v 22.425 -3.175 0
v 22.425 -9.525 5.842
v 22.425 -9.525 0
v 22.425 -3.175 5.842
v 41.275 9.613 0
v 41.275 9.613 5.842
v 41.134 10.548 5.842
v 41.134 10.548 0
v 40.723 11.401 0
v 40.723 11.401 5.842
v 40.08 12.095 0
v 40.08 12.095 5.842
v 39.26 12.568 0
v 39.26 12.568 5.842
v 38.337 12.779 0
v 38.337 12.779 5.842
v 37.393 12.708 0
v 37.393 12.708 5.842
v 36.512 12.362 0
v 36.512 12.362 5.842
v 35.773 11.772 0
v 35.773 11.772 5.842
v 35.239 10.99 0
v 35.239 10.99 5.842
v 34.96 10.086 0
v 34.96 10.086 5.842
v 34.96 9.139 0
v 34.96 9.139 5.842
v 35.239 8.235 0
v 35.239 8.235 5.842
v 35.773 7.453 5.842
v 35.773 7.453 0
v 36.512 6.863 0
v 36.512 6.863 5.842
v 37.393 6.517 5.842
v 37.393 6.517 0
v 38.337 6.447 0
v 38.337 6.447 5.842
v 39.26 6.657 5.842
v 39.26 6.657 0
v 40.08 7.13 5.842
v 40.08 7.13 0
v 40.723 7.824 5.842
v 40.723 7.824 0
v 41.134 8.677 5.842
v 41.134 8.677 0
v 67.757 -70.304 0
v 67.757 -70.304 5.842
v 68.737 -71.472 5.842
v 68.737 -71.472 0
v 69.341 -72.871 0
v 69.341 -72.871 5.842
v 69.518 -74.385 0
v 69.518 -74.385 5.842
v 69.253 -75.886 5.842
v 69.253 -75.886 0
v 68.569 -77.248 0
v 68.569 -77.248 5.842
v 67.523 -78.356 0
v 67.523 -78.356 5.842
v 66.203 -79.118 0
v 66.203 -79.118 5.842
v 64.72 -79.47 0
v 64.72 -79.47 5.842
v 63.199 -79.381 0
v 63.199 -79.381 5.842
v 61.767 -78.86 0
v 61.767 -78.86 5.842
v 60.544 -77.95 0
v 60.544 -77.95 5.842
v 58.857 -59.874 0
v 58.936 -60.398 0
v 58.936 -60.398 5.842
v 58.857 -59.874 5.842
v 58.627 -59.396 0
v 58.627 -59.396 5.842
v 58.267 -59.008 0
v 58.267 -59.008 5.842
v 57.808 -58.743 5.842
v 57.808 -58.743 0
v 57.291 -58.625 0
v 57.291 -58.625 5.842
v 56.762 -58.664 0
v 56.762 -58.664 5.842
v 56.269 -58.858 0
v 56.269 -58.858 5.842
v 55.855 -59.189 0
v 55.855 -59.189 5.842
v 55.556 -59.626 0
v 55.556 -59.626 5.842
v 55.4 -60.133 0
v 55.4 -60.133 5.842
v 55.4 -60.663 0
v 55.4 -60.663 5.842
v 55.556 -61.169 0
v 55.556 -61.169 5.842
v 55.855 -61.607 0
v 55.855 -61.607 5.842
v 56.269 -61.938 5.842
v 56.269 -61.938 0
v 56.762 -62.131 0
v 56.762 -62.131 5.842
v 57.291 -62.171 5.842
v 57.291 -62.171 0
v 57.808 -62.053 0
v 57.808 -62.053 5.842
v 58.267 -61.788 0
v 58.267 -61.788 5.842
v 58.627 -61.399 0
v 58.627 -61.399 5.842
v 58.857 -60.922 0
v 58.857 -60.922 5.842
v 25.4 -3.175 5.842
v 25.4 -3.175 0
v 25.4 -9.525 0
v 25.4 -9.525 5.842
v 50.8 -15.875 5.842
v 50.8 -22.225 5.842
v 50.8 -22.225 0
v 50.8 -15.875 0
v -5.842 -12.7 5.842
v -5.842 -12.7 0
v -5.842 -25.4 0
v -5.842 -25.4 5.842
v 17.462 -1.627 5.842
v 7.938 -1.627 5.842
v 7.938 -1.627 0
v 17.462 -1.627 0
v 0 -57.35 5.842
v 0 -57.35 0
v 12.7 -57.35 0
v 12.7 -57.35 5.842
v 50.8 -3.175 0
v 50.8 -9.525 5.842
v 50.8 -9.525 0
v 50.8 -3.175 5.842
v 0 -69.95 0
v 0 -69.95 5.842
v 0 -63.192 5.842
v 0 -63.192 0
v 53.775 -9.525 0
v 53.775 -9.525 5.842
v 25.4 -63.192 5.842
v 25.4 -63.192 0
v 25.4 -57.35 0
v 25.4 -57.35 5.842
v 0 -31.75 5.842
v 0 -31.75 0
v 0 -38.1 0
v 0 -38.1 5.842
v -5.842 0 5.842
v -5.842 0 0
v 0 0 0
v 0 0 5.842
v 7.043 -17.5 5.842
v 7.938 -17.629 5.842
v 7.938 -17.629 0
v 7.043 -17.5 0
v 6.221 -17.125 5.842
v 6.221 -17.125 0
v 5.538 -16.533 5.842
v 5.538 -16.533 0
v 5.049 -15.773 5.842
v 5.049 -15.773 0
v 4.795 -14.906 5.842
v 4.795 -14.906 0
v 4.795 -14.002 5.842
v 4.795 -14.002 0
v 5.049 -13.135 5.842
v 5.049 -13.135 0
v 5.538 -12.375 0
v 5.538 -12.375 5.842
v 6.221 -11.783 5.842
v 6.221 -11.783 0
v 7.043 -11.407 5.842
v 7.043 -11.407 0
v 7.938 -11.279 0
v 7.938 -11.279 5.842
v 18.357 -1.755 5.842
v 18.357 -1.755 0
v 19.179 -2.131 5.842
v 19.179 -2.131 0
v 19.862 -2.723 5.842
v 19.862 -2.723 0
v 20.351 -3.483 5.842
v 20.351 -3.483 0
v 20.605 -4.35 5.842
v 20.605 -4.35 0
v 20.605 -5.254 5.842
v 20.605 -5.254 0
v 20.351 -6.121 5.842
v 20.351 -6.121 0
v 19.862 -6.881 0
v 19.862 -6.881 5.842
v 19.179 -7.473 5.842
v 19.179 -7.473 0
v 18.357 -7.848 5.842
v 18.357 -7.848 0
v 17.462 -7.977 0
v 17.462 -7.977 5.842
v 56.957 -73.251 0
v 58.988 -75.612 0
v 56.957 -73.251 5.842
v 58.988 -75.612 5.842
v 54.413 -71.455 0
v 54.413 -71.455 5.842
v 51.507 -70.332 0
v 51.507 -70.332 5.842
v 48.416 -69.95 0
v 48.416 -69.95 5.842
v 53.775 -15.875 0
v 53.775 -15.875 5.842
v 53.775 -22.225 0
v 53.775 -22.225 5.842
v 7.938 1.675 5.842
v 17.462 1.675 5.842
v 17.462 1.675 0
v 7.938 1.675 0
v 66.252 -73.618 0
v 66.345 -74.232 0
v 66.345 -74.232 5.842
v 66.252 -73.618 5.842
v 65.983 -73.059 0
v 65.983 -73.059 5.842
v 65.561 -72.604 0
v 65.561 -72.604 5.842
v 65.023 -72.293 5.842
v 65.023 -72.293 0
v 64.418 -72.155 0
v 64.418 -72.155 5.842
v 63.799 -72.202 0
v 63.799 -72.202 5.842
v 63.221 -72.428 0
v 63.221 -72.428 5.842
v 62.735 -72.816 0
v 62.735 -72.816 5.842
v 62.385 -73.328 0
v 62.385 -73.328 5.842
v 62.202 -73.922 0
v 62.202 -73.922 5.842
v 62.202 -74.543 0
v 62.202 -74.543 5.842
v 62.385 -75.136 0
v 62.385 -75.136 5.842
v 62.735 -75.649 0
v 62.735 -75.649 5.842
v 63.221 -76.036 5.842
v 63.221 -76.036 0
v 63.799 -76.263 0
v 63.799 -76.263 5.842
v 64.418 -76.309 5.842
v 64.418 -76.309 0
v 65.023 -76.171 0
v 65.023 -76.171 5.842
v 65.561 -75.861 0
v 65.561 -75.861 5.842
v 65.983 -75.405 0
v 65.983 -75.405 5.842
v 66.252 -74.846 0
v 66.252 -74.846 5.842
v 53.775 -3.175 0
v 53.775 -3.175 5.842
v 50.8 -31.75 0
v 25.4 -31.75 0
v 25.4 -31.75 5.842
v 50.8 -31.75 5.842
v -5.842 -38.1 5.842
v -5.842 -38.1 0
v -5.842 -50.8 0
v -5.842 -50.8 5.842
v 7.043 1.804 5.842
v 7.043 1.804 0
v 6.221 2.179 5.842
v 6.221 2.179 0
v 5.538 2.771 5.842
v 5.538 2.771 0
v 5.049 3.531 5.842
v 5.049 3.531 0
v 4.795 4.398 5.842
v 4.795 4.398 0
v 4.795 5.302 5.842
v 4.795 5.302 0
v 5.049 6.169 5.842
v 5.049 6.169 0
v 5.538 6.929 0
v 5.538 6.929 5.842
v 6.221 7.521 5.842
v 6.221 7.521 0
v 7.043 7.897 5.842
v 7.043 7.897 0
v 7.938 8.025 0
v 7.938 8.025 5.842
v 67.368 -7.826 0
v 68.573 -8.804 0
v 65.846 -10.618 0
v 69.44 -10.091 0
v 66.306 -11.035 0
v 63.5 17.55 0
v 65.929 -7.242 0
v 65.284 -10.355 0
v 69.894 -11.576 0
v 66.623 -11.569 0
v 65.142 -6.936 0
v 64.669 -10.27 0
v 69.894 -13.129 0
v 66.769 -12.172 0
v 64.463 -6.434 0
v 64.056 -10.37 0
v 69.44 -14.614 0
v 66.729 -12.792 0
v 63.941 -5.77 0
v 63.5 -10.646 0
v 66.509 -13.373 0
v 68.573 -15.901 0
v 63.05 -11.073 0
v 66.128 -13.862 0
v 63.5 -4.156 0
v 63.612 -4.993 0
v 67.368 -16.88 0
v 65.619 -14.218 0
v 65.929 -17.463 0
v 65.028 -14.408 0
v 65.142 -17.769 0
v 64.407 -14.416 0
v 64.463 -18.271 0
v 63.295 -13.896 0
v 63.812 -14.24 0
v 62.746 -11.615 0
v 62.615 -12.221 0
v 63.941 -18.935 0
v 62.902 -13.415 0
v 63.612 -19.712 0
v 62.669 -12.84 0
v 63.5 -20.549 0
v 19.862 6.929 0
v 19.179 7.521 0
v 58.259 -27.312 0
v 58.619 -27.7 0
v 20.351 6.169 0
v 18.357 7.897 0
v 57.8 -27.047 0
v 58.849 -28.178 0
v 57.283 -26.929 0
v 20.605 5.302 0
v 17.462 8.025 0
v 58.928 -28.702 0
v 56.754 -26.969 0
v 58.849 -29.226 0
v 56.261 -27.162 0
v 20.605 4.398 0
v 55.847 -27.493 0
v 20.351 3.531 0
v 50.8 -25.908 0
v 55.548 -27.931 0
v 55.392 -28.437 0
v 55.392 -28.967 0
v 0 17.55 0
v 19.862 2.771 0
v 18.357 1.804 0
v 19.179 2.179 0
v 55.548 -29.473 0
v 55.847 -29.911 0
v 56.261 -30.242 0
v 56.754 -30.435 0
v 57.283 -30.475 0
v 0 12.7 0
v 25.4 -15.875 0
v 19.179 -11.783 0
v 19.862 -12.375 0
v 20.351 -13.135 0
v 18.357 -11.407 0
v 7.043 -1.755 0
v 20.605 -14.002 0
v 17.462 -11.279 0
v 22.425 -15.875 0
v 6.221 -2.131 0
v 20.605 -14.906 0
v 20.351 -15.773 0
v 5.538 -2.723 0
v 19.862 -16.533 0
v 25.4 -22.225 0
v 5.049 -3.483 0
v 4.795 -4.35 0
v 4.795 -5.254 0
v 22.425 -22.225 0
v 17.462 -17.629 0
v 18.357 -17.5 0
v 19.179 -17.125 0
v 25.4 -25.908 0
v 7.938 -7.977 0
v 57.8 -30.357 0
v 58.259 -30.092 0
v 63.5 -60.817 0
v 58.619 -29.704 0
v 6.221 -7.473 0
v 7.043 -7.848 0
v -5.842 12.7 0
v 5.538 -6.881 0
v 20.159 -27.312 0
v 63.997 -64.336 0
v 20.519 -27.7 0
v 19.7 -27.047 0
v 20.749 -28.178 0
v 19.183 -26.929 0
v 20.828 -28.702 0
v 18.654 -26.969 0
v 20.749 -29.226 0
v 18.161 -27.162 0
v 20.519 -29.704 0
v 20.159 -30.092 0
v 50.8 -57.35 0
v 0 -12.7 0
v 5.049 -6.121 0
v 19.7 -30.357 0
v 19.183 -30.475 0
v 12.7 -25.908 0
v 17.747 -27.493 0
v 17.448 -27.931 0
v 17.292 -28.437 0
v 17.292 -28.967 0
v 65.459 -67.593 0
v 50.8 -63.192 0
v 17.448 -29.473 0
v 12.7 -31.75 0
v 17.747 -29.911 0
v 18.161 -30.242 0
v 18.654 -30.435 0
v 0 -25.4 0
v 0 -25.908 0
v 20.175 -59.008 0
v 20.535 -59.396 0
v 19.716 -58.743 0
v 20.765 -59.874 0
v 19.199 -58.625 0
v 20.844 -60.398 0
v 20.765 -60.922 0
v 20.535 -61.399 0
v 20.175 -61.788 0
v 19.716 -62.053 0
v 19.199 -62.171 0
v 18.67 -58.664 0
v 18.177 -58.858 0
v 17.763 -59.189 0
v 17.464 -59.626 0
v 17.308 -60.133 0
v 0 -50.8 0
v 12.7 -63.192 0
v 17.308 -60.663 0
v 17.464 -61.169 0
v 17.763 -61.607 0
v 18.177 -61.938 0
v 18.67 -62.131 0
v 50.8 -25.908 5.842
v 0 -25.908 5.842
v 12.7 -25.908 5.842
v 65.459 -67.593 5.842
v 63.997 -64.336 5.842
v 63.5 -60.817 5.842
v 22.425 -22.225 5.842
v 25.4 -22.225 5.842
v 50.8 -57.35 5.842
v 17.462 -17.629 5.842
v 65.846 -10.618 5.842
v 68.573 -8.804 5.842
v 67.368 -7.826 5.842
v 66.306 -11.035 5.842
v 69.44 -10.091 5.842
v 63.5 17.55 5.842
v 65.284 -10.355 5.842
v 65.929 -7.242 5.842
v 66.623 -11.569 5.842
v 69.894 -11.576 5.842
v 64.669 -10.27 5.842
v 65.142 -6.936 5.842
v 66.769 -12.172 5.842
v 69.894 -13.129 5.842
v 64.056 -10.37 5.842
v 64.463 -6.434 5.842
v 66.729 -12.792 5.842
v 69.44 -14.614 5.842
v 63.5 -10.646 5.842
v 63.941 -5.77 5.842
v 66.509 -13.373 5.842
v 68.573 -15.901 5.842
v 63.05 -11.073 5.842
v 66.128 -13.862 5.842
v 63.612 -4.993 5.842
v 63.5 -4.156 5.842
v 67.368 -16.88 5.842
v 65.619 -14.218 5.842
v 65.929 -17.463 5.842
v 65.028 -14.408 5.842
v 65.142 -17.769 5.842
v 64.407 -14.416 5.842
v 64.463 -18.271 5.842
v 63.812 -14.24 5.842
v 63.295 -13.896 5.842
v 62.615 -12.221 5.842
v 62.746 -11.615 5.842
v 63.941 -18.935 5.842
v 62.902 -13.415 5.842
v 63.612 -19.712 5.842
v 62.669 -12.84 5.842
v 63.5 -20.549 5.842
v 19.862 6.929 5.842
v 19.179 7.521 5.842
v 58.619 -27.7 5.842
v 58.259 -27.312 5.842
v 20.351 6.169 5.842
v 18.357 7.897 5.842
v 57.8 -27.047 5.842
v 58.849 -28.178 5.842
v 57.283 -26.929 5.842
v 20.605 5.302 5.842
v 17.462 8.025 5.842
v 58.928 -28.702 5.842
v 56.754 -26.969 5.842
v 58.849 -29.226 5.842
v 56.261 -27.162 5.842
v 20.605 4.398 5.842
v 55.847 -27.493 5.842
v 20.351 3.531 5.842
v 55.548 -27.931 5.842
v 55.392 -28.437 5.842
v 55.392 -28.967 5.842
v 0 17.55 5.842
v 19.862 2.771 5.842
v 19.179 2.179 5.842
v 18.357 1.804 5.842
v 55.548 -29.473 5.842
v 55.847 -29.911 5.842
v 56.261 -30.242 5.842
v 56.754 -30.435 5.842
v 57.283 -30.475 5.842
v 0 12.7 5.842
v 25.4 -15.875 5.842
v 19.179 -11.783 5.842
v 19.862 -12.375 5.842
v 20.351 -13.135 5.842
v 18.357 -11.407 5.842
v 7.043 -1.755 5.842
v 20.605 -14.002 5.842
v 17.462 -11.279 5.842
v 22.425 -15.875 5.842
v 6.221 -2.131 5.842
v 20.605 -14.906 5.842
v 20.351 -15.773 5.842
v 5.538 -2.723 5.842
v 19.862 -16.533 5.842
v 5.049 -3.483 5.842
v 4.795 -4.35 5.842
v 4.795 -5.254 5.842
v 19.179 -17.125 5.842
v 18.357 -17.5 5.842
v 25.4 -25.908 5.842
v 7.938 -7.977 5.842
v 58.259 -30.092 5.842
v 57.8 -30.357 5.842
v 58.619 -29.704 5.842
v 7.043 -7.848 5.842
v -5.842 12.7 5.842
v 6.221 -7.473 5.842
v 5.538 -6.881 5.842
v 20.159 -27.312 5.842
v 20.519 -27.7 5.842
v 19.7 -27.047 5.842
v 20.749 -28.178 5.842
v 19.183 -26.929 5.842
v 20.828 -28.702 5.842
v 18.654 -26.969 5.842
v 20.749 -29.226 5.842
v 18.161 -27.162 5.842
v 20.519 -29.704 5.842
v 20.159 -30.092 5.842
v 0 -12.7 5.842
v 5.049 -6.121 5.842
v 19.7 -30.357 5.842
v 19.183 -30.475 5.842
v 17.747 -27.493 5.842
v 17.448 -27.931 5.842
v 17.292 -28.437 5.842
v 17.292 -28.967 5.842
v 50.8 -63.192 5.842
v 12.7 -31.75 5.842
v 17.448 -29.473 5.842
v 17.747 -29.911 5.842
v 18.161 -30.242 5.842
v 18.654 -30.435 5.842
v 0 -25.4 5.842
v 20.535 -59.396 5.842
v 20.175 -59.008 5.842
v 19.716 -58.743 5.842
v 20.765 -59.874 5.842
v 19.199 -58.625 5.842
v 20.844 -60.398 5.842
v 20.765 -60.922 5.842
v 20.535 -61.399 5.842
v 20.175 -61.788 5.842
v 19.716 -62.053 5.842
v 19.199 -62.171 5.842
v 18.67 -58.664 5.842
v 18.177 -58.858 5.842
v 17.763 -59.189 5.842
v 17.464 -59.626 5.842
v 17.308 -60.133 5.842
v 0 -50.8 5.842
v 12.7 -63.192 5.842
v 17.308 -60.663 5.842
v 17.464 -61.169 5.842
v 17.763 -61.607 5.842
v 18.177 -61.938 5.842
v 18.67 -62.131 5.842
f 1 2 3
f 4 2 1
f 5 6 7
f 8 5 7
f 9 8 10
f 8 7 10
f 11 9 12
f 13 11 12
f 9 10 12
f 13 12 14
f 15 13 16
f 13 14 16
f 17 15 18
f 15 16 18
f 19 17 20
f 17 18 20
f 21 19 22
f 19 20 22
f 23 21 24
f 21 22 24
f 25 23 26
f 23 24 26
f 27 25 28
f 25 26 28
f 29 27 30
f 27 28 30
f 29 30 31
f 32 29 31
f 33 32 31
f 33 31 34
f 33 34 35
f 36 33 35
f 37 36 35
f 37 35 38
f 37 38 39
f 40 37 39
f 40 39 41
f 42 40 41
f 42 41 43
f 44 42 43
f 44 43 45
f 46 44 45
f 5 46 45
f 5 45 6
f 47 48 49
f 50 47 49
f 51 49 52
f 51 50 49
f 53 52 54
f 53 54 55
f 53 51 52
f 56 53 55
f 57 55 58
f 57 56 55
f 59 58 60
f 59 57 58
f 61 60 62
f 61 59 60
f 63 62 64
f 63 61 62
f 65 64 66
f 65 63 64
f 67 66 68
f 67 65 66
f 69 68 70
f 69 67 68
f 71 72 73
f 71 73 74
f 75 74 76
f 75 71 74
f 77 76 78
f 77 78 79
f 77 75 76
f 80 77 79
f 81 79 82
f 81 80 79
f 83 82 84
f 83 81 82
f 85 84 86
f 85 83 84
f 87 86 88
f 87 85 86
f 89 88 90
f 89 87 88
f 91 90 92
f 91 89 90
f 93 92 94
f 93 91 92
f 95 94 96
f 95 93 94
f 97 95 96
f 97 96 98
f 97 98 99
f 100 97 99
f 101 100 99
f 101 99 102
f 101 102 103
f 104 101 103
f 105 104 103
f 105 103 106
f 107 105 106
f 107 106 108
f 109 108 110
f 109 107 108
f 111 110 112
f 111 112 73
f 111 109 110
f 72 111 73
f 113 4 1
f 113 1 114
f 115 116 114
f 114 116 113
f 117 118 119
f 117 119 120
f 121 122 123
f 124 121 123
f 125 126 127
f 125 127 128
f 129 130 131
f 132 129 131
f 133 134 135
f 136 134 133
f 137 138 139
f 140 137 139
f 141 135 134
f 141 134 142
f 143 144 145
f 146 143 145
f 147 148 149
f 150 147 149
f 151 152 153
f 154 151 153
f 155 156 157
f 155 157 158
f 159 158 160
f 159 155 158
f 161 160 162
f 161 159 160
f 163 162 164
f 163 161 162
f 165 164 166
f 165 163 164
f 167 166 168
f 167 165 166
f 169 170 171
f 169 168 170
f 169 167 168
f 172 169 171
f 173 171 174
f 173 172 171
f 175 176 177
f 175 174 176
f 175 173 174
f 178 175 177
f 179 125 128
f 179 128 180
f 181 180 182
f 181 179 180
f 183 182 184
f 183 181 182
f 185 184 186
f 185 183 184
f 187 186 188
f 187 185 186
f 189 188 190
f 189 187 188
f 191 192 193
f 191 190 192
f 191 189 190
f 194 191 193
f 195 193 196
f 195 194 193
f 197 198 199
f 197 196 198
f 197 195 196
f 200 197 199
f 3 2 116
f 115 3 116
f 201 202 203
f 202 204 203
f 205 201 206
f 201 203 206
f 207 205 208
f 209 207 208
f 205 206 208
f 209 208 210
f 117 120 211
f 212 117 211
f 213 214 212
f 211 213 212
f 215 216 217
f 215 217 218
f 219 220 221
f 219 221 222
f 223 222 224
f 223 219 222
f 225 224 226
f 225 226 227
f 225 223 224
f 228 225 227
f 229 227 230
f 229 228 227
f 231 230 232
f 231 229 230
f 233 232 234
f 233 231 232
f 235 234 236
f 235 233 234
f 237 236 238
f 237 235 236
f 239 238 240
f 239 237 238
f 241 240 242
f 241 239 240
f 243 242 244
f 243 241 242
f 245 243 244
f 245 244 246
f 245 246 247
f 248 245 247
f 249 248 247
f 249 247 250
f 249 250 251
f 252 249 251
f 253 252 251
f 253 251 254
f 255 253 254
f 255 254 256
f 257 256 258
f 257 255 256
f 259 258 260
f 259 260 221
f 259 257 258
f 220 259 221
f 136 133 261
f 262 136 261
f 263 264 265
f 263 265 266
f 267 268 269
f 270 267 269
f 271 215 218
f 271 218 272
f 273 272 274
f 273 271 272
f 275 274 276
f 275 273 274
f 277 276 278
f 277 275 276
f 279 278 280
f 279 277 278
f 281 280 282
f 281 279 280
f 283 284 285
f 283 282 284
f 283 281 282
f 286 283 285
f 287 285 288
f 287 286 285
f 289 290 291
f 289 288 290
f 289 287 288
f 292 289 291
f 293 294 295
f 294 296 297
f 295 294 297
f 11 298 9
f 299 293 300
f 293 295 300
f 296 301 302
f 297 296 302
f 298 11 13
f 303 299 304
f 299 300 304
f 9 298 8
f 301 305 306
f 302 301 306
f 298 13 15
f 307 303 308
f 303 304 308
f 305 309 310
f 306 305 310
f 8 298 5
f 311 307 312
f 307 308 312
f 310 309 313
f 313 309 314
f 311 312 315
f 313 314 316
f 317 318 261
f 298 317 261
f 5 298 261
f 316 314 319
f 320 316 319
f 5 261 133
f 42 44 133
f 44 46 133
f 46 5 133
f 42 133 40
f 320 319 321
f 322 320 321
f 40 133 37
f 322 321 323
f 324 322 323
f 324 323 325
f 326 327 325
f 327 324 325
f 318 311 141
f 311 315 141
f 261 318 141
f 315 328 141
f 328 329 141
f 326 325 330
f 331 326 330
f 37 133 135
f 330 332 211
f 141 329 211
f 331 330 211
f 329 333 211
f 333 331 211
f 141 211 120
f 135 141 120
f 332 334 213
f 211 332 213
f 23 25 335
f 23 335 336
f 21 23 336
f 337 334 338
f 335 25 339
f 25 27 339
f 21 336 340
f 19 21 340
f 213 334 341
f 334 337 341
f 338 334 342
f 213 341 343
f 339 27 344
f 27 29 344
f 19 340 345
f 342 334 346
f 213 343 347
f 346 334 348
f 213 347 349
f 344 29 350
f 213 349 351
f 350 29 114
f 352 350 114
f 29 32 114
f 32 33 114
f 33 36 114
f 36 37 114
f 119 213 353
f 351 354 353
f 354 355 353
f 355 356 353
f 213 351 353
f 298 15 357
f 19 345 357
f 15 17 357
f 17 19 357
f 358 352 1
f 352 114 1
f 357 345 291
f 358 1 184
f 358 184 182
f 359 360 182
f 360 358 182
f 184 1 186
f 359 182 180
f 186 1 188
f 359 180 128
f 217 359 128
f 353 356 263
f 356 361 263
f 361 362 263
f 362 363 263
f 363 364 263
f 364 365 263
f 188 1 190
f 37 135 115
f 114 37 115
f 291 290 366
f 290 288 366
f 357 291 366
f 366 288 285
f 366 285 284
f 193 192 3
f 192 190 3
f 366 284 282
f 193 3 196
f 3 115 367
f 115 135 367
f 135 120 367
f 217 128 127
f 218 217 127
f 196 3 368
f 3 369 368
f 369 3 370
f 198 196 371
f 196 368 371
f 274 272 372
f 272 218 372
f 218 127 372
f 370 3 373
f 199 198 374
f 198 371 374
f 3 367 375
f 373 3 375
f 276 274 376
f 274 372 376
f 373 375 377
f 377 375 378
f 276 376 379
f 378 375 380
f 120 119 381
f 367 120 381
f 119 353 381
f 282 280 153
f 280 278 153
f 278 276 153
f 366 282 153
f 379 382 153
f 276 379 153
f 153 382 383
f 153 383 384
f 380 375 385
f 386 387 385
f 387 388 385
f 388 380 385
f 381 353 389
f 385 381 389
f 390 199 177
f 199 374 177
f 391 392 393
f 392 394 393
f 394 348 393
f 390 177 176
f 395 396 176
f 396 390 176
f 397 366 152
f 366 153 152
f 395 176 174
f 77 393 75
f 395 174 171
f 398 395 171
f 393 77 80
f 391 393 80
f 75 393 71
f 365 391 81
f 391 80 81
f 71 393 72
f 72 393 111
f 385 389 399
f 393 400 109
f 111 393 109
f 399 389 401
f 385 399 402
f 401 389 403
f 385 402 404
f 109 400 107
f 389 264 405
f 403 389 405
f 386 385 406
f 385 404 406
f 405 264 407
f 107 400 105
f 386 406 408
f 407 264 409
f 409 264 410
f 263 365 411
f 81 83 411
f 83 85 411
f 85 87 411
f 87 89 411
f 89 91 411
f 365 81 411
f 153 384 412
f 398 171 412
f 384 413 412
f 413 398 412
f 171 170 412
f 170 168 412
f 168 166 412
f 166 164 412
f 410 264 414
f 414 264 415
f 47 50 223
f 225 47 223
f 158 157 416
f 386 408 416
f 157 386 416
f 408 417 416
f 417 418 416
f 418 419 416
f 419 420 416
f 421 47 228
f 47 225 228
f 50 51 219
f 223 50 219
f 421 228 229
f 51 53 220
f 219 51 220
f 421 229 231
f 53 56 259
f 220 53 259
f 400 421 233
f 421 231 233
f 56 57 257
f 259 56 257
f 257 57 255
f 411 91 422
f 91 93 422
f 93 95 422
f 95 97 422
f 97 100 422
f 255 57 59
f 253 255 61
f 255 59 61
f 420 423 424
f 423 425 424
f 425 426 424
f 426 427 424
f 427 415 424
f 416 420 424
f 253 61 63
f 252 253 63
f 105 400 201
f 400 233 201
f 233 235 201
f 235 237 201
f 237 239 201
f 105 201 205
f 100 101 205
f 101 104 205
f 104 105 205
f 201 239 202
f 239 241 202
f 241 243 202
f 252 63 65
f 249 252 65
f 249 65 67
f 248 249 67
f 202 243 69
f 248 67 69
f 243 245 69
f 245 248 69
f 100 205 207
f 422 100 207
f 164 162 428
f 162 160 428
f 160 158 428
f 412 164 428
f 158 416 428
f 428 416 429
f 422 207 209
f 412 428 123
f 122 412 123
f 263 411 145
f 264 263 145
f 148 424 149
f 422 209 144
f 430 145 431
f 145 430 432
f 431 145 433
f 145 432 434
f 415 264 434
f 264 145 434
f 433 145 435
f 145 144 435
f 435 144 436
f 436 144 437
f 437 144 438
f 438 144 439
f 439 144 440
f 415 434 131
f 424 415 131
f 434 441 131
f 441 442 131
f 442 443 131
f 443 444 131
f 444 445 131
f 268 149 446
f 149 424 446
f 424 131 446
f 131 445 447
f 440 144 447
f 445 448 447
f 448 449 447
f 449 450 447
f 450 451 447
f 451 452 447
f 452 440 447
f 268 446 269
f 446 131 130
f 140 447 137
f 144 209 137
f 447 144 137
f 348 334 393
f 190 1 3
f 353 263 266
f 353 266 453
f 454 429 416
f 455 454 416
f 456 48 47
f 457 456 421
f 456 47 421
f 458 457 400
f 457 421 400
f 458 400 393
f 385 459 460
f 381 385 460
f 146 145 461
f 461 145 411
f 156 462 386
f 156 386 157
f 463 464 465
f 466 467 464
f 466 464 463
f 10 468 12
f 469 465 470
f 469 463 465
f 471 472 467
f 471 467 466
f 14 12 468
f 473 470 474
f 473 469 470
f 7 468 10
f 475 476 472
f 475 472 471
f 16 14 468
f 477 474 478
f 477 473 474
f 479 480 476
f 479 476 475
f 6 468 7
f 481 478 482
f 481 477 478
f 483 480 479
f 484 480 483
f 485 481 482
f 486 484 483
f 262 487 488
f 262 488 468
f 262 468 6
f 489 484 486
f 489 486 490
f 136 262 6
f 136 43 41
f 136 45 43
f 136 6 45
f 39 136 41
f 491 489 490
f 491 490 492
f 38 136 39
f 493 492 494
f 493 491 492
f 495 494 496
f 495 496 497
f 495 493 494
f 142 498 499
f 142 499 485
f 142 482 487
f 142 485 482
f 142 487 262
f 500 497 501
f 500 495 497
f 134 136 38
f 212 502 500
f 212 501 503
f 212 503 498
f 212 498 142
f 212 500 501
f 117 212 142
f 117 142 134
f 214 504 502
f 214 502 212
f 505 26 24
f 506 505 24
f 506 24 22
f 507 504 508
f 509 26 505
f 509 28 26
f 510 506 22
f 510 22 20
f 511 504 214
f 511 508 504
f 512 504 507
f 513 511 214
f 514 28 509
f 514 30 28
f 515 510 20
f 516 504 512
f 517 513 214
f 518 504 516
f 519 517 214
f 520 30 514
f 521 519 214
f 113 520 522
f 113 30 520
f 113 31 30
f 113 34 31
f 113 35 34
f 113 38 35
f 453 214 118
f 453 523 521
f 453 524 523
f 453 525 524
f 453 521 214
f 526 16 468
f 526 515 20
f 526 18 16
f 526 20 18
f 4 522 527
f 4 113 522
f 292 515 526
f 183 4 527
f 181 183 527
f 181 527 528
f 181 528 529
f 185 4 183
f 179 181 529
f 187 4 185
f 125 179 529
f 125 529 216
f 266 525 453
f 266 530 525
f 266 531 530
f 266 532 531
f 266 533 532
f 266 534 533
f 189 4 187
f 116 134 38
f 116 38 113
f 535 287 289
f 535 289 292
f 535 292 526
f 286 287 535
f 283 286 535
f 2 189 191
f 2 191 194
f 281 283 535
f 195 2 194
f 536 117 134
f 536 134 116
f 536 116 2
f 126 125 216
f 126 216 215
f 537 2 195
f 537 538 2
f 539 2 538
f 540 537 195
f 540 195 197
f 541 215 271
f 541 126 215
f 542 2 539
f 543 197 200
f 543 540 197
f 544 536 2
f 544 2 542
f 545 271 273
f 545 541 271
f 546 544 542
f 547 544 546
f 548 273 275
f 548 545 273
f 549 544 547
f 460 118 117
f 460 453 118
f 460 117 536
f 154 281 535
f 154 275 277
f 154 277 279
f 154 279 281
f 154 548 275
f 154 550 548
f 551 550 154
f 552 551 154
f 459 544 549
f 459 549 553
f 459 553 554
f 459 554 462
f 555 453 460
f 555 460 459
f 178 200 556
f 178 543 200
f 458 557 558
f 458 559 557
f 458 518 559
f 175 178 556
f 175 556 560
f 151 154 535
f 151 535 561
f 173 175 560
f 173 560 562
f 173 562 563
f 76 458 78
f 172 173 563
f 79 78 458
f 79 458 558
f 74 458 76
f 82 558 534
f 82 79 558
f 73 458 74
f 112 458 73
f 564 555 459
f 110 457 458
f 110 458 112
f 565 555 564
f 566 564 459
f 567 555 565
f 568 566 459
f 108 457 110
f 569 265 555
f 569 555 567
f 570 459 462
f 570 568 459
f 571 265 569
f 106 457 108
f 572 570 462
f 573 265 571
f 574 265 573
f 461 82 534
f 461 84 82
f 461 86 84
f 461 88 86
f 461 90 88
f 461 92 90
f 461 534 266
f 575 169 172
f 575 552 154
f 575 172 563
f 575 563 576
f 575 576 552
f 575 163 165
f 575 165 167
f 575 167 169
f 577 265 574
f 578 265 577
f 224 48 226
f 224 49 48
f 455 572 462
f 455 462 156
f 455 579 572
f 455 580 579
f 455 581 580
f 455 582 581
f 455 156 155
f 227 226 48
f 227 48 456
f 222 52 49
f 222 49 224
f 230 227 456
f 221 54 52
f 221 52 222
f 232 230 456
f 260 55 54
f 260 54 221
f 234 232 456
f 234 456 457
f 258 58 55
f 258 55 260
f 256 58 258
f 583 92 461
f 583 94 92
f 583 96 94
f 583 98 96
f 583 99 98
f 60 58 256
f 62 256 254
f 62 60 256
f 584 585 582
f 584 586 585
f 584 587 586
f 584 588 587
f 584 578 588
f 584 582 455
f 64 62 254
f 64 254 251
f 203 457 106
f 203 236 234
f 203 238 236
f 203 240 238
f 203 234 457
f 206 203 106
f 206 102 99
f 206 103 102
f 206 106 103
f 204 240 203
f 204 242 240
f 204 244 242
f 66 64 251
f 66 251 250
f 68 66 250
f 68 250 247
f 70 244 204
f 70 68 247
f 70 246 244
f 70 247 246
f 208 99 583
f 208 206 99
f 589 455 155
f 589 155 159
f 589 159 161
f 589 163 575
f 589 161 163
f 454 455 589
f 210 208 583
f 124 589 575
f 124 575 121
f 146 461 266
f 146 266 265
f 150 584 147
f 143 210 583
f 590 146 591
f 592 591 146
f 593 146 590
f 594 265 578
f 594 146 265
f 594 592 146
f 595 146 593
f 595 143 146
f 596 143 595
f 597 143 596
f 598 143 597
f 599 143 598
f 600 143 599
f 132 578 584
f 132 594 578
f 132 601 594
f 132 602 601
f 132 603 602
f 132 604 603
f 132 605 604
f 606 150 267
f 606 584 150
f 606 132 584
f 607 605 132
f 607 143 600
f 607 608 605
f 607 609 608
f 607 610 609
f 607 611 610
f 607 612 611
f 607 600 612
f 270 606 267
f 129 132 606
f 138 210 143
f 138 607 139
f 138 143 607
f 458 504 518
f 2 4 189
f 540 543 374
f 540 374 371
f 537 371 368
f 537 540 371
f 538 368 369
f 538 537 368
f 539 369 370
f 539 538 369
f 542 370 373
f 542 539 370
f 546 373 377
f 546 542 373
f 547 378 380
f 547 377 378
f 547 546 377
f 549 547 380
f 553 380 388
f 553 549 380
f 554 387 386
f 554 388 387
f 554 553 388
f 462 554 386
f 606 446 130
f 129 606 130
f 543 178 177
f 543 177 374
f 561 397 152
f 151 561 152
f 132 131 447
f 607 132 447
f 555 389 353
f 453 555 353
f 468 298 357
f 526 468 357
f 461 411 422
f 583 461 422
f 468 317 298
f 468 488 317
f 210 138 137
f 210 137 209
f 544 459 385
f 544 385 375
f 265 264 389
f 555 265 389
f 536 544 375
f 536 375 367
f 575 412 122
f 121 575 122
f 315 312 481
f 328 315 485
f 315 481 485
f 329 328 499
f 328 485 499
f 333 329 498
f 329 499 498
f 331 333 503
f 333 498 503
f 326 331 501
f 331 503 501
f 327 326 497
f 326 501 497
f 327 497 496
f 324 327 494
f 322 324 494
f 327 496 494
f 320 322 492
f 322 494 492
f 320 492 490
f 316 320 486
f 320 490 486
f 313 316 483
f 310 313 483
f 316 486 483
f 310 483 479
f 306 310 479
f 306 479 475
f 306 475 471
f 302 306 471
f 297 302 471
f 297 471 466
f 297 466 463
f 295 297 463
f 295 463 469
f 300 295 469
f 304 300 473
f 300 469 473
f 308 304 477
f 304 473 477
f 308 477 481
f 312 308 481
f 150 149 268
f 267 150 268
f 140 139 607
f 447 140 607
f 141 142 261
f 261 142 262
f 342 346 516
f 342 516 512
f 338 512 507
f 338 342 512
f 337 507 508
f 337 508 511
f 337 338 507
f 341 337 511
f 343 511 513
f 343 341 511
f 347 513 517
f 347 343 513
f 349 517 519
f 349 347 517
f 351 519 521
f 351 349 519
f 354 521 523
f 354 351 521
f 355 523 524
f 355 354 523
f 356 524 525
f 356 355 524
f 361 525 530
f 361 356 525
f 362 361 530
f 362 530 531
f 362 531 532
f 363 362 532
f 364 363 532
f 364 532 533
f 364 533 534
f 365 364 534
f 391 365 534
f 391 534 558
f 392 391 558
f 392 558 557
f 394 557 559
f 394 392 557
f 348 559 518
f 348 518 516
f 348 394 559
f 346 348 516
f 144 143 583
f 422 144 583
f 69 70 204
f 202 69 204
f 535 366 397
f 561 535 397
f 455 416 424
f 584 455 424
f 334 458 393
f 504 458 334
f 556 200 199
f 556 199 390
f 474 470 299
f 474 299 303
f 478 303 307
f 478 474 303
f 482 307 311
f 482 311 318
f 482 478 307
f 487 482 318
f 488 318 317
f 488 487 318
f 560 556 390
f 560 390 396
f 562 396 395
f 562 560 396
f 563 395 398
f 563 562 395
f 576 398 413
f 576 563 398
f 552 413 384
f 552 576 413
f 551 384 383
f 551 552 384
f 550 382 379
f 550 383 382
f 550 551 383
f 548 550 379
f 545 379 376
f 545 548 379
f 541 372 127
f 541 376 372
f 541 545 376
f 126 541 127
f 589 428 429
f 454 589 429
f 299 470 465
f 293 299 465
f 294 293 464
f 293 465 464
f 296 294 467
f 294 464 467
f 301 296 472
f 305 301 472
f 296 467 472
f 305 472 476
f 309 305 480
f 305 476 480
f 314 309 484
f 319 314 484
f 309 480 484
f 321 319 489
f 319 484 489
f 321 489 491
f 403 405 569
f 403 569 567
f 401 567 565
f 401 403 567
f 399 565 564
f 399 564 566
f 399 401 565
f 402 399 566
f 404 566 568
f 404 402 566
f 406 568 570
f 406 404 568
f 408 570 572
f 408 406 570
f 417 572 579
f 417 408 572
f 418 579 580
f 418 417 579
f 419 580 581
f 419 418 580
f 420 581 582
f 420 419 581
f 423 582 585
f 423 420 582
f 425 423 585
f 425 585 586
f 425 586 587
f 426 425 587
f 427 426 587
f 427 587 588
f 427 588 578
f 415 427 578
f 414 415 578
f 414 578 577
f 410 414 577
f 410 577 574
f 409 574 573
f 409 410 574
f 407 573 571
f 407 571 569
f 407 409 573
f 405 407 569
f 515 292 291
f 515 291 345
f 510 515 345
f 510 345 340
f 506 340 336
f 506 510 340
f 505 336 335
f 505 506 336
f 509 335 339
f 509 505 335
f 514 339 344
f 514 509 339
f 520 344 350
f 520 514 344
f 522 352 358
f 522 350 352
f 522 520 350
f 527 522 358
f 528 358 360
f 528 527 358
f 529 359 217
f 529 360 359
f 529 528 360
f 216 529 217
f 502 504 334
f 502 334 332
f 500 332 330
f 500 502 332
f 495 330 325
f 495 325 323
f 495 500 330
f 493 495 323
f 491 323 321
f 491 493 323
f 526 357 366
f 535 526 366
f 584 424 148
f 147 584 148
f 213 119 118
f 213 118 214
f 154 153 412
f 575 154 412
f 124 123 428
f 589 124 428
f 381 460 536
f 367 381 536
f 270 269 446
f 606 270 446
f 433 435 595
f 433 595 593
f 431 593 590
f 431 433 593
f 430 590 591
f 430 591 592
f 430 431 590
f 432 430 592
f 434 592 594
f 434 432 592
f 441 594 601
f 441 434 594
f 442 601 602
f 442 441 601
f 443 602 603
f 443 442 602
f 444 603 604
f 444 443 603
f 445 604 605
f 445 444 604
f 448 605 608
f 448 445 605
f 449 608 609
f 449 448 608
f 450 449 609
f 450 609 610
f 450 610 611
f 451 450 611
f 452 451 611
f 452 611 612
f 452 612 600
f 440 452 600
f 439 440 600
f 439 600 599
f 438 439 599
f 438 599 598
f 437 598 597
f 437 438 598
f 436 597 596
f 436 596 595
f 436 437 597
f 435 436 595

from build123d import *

# Parameters (mm, degrees)
SKETCH1_R           = 1.778
SKETCH1_W           = 25.4
SKETCH1_H           = 5.842
BOSS_EXTRUDE1_DEPTH = 5.842
SKETCH2_W           = 63.5
SKETCH2_H           = 6.757924
BOSS_EXTRUDE2_DEPTH = 5.842
FILLET1_R           = 3.175
SKETCH4_R           = 3.175
SKETCH4_W           = 2.975
SKETCH4_H           = 6.35
CUT_EXTRUDE2_DEPTH  = 95.65387769
CUT_EXTRUDE3_DEPTH  = 95.65387769
BOSS_EXTRUDE4_START = -5.842
SKETCH7_R           = 2.0828
BOSS_EXTRUDE4_DEPTH = 5.842
FILLET12_R          = 12.7
SKETCH8_R           = 2.0828
BOSS_EXTRUDE5_DEPTH = 5.842
FILLET13_R          = 3.175
SKETCH9_R           = 2.0828
CUT_EXTRUDE4_DEPTH  = 107.047047485


with BuildPart() as part:
    # Sketch1 → Boss-Extrude1 (new body)
    with BuildSketch(Plane.XY):
        Polygon((0, 12.7), (-5.842, 12.7), (-5.842, 0), (0, 0), (0, -12.7), (-5.842, -12.7), (-5.842, -25.4), (0, -25.4), (0, -25.908), (12.7, -25.908), (12.7, -31.75), (0, -31.75), (0, -38.1), (-5.842, -38.1), (-5.842, -50.8), (0, -50.8), (0, -57.349898), (12.7, -57.349898), (12.7, -63.191898), (25.4, -63.191898), (25.4, -57.349898), (50.8, -57.349898), (50.8, -63.191898), (63.5, -63.191898), (63.5, 17.55013), (0, 17.55013), align=None)
        with Locations((19.065986419, -60.397898)):
            Circle(SKETCH1_R, mode=Mode.SUBTRACT)
        with Locations((19.05, -28.702)):
            Circle(SKETCH1_R, mode=Mode.SUBTRACT)
        with Locations((57.157993209, -60.397898)):
            Circle(SKETCH1_R, mode=Mode.SUBTRACT)
        with Locations((38.1, -28.829)):
            Rectangle(SKETCH1_W, SKETCH1_H, mode=Mode.SUBTRACT)
        with Locations((57.15, -28.702)):
            Circle(SKETCH1_R, mode=Mode.SUBTRACT)
    extrude(amount=BOSS_EXTRUDE1_DEPTH)

    # Sketch2 → Boss-Extrude2 (add)
    with BuildSketch(Plane.XY.offset(5.842)):
        with Locations((31.75, -66.57086)):
            Rectangle(SKETCH2_W, SKETCH2_H)
    extrude(amount=-BOSS_EXTRUDE2_DEPTH)

    # Fillet1
    fillet1_edges = [part.edges().sort_by_distance(p)[0] for p in [
        (63.5, -69.949822, 2.921),
    ]]
    fillet(fillet1_edges, radius=FILLET1_R)

    # Sketch4 → Cut-Extrude2 (cut, through all)
    with BuildSketch(Plane.XY.offset(5.842)):
        with Locations((38.1, 9.61263)):
            Circle(SKETCH4_R)
        with Locations((23.9125, -6.35)):
            Rectangle(SKETCH4_W, SKETCH4_H)
        with Locations((23.9125, -19.05)):
            Rectangle(SKETCH4_W, SKETCH4_H)
        with Locations((52.2875, -19.05)):
            Rectangle(SKETCH4_W, SKETCH4_H)
        with Locations((52.2875, -6.35)):
            Rectangle(SKETCH4_W, SKETCH4_H)
    extrude(amount=-CUT_EXTRUDE2_DEPTH, mode=Mode.SUBTRACT)

    # Sketch5 → Cut-Extrude3 (cut, through all)
    with BuildSketch(Plane.XY.offset(5.842)):
        with BuildLine():
            Line((7.9375, 8.02513), (17.4625, 8.02513))
            ThreePointArc((17.4625, 8.02513), (20.6375, 4.85013), (17.4625, 1.67513))
            Line((17.4625, 1.67513), (7.9375, 1.67513))
            ThreePointArc((7.9375, 1.67513), (4.7625, 4.85013), (7.9375, 8.02513))
        make_face()
        with BuildLine():
            Line((7.9375, -1.62687), (17.4625, -1.62687))
            ThreePointArc((17.4625, -1.62687), (20.6375, -4.80187), (17.4625, -7.97687))
            Line((17.4625, -7.97687), (7.9375, -7.97687))
            ThreePointArc((7.9375, -7.97687), (4.7625, -4.80187), (7.9375, -1.62687))
        make_face()
        with BuildLine():
            Line((7.9375, -11.27887), (17.4625, -11.27887))
            ThreePointArc((17.4625, -11.27887), (20.6375, -14.45387), (17.4625, -17.62887))
            Line((17.4625, -17.62887), (7.9375, -17.62887))
            ThreePointArc((7.9375, -17.62887), (4.7625, -14.45387), (7.9375, -11.27887))
        make_face()
    extrude(amount=-CUT_EXTRUDE3_DEPTH, mode=Mode.SUBTRACT)

    # Sketch7 → Boss-Extrude4 (add)
    with BuildSketch(Plane.XY.offset(5.842).offset(BOSS_EXTRUDE4_START)):
        with BuildLine():
            Line((60.544173966, -77.950003252), (55.218486469, -69.949822))
            Line((55.218486469, -69.949822), (60.325, -69.949822))
            ThreePointArc((60.325, -69.949822), (62.57006403, -69.01988603), (63.5, -66.774822))
            Line((63.5, -66.774822), (67.615323654, -70.182525218))
            ThreePointArc((67.615323654, -70.182525218), (68.150012892, -77.771642798), (60.544173966, -77.950003252))
        make_face()
        with Locations((64.262, -74.232177218)):
            Circle(SKETCH7_R, mode=Mode.SUBTRACT)
    extrude(amount=BOSS_EXTRUDE4_DEPTH)

    # Fillet12
    fillet12_edges = [part.edges().sort_by_distance(p)[0] for p in [
        (55.218486469, -69.949822, 2.921),
        (63.5, -66.774822, 2.921),
    ]]
    fillet(fillet12_edges, radius=FILLET12_R)

    # Sketch8 → Boss-Extrude5 (add)
    with BuildSketch(Plane.XY.offset(5.842)):
        with BuildLine():
            Line((64.693546, -17.610328), (63.5, -17.610328))
            Line((63.5, -17.610328), (63.5, -17.473065939))
            ThreePointArc((63.5, -17.473065939), (59.435746, -12.352528), (63.5, -7.231990061))
            Line((63.5, -7.231990061), (63.5, -7.094728))
            Line((63.5, -7.094728), (64.693546, -7.094728))
            ThreePointArc((64.693546, -7.094728), (69.951346, -12.352528), (64.693546, -17.610328))
        make_face()
        with Locations((64.693546, -12.352528)):
            Circle(SKETCH8_R, mode=Mode.SUBTRACT)
    extrude(amount=-BOSS_EXTRUDE5_DEPTH)

    # Fillet13
    # the kernel refuses this fillet: 3.175 mm, written as the material it adds along each edge
    with BuildSketch(Plane(origin=(63.5, -7.094728, 5.842), x_dir=(0, 1, 0), z_dir=(0, 0, -1))) as fillet13_piece_1:
        with BuildLine():
            CenterArc((2.938903965, 3.175), FILLET13_R, 193.589847282, 76.410152718)
            Line((-0.147204456, 2.428970633), (-0.455815298, 2.354367696))
            ThreePointArc((-0.455815298, 2.354367696), (-0.3175, 1.193546), (-0.3175, 0))
            Line((-0.3175, 0), (0, -0.3175))
            Line((0, -0.3175), (2.938903965, -0.3175))
            Line((2.938903965, -0.3175), (2.938903965, 0))
        make_face()
    extrude(amount=5.842)
    with BuildSketch(Plane(origin=(63.5, -17.610328, 5.842), x_dir=(0.9981686426778995, 0.0604926505830248, 0), z_dir=(0, 0, -1))) as fillet13_piece_2:
        with BuildLine():
            CenterArc((2.99140335, 3.125585947), FILLET13_R, 183.468090933, 76.410152718)
            Line((-0.177782091, 2.933521781), (-0.494700635, 2.914315365))
            Line((-0.494700635, 2.914315365), (-0.316918544, -0.019206417))
            Line((-0.316918544, -0.019206417), (0.019206417, -0.316918544))
            ThreePointArc((0.019206417, -0.316918544), (1.210566607, -0.244717783), (2.377629483, -0.312558595))
            Line((2.377629483, -0.312558595), (2.433427107, 0))
        make_face()
    extrude(amount=5.842)
    # the kernel refuses this fillet: 3.175 mm, written as the material it takes off along each edge

    # Sketch9 → Cut-Extrude4 (cut, through all)
    with BuildSketch(Plane.XY.offset(5.842)):
        with Locations((64.693546, -12.352528)):
            Circle(SKETCH9_R)
    extrude(amount=-CUT_EXTRUDE4_DEPTH, mode=Mode.SUBTRACT)


solid = part.part
